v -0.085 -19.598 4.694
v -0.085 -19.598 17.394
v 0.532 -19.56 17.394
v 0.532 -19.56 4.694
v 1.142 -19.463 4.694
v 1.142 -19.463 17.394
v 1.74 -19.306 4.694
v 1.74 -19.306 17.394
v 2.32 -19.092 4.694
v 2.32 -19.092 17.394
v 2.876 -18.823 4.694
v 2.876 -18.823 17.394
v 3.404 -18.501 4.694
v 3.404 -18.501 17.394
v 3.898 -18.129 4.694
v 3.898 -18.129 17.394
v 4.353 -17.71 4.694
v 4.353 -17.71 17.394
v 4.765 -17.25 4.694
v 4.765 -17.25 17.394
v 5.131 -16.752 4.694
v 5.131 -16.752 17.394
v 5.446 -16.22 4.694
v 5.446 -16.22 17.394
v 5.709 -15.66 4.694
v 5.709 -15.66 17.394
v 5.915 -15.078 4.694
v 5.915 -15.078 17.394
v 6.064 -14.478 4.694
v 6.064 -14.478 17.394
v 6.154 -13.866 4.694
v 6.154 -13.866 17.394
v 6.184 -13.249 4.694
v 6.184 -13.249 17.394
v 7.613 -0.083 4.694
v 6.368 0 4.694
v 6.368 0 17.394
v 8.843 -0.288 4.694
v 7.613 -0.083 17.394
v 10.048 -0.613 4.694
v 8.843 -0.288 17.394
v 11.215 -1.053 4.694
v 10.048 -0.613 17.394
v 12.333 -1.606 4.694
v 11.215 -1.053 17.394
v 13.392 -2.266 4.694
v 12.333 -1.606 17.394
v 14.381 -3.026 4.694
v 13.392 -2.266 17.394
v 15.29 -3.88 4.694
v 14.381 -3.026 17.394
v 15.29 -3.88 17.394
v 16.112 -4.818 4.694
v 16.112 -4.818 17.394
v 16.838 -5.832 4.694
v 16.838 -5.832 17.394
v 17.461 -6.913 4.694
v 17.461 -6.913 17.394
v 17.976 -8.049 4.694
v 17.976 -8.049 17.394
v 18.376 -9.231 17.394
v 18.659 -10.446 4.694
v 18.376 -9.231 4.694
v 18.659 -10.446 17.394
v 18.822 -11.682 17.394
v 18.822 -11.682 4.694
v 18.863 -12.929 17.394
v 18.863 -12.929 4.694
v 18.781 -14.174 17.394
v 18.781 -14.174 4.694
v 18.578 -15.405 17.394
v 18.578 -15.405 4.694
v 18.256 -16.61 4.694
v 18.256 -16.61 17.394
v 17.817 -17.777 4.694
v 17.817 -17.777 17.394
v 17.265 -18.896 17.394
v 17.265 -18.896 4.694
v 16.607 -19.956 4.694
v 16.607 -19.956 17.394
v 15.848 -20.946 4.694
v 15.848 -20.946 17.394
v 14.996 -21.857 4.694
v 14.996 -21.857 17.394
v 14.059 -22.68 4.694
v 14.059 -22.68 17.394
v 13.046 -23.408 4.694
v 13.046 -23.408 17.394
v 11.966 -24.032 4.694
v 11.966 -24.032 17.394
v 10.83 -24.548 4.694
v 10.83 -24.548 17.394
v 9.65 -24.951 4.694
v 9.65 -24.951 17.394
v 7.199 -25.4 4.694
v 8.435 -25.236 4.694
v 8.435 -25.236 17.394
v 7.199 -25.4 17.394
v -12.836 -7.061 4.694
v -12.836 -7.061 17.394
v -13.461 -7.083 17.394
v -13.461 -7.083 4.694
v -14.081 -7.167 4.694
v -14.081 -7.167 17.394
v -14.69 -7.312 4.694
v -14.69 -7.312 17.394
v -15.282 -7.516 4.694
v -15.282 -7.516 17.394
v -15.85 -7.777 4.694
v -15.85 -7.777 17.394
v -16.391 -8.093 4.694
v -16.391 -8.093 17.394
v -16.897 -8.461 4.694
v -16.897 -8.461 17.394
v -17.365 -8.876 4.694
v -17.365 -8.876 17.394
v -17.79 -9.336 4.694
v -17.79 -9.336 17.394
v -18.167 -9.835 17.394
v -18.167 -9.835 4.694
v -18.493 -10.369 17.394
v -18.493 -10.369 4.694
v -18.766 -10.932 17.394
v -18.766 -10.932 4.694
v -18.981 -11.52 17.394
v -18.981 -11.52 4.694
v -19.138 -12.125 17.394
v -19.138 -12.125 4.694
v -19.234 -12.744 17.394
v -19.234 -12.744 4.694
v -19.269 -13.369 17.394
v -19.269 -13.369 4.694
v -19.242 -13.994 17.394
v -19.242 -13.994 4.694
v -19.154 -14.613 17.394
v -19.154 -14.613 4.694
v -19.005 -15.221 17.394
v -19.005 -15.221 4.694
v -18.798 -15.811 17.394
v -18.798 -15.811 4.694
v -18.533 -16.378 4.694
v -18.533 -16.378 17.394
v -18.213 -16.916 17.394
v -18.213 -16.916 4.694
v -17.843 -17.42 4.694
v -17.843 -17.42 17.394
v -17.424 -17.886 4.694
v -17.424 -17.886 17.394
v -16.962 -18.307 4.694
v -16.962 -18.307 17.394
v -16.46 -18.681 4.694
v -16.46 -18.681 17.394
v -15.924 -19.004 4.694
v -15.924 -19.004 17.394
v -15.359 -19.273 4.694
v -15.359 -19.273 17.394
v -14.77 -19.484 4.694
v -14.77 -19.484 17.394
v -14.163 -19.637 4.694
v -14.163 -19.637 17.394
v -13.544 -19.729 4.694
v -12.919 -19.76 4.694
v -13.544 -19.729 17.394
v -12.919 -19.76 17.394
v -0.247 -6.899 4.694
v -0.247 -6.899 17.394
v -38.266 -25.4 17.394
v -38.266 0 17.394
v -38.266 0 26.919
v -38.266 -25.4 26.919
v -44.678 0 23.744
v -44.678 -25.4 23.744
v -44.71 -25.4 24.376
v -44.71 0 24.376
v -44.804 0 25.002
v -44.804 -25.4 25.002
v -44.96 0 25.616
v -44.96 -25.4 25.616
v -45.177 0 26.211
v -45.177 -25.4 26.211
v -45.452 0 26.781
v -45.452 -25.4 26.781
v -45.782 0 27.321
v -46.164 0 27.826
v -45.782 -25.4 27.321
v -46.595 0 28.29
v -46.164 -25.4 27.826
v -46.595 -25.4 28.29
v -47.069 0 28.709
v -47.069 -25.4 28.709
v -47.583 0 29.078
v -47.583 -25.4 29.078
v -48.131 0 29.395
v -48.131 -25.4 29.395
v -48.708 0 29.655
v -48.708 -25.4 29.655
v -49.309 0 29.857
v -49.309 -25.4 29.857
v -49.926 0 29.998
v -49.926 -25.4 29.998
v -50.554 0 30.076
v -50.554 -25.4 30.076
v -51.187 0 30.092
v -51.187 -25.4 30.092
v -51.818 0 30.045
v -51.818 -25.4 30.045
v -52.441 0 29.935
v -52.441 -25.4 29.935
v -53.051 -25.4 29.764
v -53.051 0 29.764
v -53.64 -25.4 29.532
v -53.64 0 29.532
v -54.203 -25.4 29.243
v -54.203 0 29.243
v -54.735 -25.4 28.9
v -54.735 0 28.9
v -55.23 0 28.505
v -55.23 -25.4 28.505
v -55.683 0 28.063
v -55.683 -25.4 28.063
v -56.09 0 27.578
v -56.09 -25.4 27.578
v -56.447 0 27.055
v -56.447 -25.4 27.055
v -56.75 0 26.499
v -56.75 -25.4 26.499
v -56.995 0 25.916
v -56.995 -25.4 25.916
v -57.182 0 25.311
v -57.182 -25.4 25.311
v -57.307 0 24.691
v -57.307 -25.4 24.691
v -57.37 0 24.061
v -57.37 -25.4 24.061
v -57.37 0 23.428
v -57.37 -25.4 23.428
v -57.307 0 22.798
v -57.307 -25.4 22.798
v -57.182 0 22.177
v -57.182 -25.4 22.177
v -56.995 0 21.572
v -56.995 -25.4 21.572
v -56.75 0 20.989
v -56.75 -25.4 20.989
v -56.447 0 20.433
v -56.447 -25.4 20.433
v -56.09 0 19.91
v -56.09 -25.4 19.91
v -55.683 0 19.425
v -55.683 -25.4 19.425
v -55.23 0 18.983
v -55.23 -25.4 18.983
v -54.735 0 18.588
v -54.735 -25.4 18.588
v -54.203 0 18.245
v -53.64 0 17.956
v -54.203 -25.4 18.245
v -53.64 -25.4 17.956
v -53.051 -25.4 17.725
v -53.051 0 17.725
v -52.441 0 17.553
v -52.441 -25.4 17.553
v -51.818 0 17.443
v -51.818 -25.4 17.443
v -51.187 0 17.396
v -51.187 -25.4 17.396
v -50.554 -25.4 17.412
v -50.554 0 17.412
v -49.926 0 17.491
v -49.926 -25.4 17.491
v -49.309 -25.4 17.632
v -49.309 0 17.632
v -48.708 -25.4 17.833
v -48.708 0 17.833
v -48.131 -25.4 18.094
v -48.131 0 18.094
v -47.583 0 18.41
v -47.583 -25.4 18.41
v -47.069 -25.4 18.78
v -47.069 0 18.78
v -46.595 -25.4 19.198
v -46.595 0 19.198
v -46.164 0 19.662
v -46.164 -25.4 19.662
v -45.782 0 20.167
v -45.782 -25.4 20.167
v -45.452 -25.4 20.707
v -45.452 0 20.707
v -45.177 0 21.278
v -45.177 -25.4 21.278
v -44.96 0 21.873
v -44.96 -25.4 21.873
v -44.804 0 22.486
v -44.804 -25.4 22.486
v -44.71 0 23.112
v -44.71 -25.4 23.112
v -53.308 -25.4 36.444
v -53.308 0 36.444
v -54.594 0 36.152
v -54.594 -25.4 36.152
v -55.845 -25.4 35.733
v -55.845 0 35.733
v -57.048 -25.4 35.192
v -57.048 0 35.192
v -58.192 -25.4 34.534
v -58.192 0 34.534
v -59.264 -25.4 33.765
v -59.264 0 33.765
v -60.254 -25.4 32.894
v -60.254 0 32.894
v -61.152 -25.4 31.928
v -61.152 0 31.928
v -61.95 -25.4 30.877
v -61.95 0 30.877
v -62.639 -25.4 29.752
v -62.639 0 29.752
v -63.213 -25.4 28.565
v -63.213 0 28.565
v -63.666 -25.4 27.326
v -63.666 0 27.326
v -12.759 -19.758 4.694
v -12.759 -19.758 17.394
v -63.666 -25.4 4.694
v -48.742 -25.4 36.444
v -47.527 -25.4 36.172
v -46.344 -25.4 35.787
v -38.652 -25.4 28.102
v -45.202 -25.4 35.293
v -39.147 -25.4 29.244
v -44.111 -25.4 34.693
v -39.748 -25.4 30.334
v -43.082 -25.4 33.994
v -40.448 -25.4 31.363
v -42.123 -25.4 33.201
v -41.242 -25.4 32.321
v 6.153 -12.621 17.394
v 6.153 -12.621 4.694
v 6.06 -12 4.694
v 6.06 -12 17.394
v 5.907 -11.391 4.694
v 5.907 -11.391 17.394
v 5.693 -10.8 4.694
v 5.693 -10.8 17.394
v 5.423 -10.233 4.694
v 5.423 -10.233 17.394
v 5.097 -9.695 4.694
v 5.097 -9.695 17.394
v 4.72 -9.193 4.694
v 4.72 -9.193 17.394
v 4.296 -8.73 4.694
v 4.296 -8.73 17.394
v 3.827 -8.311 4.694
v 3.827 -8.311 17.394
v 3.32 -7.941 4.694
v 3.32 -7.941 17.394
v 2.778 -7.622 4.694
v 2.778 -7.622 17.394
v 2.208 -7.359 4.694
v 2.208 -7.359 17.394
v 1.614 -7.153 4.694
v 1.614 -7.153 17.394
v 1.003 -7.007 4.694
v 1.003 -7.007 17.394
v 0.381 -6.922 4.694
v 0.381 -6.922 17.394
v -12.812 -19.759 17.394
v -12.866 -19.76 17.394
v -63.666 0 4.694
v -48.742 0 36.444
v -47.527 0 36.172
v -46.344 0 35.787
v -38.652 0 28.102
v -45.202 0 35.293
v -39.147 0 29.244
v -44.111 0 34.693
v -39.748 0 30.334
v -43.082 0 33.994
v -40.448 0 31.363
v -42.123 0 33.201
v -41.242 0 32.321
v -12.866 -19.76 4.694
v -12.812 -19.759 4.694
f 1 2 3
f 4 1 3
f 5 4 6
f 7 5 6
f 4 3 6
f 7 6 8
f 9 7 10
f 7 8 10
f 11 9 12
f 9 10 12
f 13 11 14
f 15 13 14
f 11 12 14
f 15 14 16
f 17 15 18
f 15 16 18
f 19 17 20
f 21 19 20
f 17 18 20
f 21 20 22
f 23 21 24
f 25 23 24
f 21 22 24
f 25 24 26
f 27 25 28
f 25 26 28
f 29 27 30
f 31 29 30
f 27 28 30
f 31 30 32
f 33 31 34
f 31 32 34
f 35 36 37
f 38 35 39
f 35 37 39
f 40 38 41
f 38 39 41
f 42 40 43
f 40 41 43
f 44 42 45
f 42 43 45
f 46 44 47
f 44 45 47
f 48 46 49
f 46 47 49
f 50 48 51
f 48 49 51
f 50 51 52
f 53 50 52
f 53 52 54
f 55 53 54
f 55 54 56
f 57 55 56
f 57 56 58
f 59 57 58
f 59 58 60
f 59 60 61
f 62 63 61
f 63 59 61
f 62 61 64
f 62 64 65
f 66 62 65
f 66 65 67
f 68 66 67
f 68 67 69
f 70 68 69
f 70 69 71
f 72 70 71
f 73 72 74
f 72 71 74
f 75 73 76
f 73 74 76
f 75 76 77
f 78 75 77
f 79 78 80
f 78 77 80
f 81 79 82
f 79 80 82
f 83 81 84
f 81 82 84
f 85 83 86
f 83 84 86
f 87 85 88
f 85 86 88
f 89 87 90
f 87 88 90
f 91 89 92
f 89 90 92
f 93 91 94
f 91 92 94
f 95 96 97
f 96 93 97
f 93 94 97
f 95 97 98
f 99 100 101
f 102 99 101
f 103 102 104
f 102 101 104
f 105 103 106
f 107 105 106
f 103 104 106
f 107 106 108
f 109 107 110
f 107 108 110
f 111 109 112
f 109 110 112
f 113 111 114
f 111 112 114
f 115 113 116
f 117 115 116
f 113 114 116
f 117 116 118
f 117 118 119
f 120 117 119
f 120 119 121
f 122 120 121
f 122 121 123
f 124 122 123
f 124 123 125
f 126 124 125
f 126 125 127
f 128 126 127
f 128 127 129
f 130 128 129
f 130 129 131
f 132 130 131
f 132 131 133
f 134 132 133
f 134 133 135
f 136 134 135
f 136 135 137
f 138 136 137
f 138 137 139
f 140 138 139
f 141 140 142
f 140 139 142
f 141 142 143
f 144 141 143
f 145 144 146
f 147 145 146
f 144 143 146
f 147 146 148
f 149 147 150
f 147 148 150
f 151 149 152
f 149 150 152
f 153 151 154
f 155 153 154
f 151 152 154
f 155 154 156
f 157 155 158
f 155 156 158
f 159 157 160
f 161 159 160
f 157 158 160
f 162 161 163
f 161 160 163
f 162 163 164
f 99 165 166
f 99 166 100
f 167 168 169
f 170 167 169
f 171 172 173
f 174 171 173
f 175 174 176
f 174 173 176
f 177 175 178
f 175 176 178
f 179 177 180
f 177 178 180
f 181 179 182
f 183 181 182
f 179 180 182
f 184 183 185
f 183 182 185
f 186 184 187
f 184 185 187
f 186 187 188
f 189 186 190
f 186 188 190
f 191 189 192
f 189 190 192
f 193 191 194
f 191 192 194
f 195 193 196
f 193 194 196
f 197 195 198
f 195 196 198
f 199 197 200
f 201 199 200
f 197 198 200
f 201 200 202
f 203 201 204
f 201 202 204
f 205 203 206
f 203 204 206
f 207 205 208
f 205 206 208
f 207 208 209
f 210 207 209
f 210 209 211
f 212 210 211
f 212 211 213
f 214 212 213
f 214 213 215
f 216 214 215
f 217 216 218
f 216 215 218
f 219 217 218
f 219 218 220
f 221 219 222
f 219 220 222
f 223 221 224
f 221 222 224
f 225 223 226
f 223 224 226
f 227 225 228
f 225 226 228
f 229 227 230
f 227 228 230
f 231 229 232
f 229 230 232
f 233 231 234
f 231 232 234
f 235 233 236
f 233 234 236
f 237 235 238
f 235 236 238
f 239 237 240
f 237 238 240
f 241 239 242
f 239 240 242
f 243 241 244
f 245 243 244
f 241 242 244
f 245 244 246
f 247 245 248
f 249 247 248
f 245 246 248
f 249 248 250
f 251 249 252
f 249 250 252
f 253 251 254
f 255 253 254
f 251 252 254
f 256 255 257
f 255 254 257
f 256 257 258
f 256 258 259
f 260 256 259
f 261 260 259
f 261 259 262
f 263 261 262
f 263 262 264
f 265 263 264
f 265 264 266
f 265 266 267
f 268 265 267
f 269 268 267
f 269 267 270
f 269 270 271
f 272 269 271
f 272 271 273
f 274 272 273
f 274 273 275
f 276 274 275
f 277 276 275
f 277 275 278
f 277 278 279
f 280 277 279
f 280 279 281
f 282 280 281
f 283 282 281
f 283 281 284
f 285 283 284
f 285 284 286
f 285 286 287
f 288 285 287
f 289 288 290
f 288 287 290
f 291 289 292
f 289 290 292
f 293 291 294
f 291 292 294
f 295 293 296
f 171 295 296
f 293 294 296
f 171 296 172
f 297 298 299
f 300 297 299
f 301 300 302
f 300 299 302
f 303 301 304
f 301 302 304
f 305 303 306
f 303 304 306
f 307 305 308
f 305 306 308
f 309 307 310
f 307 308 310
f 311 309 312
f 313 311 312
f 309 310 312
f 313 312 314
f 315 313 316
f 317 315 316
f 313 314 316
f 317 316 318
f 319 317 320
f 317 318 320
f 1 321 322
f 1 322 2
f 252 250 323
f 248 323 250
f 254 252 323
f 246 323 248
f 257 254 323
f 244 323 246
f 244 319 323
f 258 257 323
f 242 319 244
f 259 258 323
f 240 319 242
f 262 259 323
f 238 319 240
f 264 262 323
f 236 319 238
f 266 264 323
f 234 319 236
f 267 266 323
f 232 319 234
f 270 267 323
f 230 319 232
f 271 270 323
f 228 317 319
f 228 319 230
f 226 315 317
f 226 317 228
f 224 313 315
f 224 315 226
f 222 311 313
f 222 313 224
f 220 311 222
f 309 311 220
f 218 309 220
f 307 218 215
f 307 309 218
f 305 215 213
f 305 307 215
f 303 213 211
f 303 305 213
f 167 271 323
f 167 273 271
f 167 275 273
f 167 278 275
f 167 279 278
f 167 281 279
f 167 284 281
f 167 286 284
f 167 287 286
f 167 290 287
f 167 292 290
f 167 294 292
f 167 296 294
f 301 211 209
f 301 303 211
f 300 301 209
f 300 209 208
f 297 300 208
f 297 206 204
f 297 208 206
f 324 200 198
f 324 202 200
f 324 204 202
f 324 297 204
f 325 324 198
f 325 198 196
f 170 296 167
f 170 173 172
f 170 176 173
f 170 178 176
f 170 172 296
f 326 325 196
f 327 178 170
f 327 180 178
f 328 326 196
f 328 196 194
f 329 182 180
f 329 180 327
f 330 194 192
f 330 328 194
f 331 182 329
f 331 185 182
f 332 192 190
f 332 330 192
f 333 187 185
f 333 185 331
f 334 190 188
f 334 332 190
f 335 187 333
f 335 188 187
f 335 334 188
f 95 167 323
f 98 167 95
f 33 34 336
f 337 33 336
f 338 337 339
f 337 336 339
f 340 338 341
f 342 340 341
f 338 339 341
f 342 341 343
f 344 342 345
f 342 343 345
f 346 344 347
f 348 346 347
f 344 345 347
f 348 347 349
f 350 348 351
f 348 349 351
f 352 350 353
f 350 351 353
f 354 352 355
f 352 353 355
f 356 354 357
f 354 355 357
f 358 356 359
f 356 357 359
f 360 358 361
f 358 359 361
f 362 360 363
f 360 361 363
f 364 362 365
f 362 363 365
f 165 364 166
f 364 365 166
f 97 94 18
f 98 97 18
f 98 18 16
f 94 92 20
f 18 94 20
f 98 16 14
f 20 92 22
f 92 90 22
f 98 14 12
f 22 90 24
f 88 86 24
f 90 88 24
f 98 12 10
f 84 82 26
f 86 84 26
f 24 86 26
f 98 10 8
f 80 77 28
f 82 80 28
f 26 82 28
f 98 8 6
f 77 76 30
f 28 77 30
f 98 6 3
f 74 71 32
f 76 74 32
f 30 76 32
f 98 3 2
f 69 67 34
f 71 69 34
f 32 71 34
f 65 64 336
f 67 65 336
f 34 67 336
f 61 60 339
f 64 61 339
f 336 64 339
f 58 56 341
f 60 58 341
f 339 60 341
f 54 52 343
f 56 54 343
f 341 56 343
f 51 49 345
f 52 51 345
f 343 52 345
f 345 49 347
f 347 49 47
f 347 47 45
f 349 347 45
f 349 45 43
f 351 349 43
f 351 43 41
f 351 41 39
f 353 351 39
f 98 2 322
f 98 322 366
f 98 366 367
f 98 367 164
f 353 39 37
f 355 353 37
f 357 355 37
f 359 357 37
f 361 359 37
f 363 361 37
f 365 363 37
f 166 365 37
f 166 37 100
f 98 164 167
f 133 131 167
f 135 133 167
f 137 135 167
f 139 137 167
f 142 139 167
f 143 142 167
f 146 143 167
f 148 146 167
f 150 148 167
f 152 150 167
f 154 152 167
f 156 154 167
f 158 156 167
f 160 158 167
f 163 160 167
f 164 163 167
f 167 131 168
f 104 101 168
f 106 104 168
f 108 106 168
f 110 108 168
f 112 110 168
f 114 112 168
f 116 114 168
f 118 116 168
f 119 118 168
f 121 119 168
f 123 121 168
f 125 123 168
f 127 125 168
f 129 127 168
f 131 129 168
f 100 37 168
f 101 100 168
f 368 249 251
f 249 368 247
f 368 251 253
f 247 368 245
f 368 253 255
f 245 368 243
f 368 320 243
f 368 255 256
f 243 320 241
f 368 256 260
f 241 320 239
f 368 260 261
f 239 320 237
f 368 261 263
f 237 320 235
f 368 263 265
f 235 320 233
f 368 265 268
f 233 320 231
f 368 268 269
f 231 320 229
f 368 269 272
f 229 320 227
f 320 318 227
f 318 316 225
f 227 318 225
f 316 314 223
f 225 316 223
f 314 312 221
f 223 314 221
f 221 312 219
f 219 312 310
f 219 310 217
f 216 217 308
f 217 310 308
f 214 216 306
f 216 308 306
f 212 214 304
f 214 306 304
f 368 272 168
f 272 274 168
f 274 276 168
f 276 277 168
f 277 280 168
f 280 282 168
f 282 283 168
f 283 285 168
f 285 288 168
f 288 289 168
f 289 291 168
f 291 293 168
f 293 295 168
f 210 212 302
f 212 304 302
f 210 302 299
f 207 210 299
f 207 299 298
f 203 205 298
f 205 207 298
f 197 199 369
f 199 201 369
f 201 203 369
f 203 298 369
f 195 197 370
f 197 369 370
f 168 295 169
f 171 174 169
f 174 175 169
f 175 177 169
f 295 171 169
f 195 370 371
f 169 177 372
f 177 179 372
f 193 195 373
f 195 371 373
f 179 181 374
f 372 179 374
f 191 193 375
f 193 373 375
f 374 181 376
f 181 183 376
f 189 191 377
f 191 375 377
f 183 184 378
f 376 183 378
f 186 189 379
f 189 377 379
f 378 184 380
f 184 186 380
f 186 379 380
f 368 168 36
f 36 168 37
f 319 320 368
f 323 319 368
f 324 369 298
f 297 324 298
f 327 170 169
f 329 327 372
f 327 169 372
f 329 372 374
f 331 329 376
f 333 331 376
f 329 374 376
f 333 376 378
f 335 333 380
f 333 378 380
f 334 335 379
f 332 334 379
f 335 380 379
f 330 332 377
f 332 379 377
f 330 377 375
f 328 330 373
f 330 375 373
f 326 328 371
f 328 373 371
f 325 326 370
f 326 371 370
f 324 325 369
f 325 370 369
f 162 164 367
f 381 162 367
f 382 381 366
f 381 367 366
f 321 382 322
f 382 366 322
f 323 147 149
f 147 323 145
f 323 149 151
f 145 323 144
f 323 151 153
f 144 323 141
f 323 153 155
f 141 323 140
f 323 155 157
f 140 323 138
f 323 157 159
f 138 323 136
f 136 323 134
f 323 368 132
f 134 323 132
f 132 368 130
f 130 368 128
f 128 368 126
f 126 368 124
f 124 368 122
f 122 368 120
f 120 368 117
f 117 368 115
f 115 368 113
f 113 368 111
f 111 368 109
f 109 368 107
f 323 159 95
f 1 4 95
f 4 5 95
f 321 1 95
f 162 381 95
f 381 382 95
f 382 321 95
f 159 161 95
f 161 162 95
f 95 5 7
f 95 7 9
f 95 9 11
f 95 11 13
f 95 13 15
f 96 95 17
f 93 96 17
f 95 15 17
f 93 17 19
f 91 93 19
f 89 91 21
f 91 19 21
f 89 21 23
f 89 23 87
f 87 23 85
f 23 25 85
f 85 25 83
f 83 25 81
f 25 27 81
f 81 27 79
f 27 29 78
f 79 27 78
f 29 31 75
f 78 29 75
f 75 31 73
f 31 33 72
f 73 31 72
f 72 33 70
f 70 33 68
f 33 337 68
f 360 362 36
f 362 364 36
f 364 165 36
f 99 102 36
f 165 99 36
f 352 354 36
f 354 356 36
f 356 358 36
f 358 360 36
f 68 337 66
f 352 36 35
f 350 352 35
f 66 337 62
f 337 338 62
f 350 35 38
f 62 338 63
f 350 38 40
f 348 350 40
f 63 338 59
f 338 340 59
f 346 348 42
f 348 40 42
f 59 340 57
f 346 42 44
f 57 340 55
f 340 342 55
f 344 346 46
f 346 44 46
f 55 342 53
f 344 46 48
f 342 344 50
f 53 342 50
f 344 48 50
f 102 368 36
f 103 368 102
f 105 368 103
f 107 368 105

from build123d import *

# Parameters (mm, degrees)
F1_DEPTH = 25.4
F4_DEPTH = 25.4
F5_R     = 6.35
F6_DEPTH = 25.4
F8_DEPTH = 25.4


with BuildPart() as f1:
    # F0 (on Front) → F1 (new body)
    with BuildSketch(Plane.XZ):
        with BuildLine():
            Line((-48.741896, 36.444197), (-53.308046, 36.444197))
            ThreePointArc((-53.308046, 36.444197), (-59.769484, 33.341808), (-63.66557, 27.325537))
            Line((-63.66557, 27.325537), (-63.66557, 4.694197))
            Line((-63.66557, 4.694197), (18.88443, 4.694197))
            Line((18.88443, 4.694197), (18.88443, 17.394197))
            Line((18.88443, 17.394197), (-38.26557, 17.394197))
            Line((-38.26557, 17.394197), (-38.26557, 26.919197))
            ThreePointArc((-38.26557, 26.919197), (-42.1227, 33.200663), (-48.741896, 36.444197))
        make_face()
    extrude(amount=F1_DEPTH)

    # F3 (on face) → F4 (cut)
    with BuildSketch(Plane.XY.offset(17.394197)):
        with BuildLine():
            ThreePointArc((6.368123, 0), (18.857612, -12.305201), (7.198642, -25.4))
            Line((7.198642, -25.4), (18.88443, -25.4))
            Line((18.88443, -25.4), (18.88443, 0))
            Line((18.88443, 0), (6.368123, 0))
        make_face()
    extrude(amount=-F4_DEPTH, mode=Mode.SUBTRACT)

    # F5 (on face) → F6 (cut)
    with BuildSketch(Plane.XZ.offset(25.4)):
        with Locations((-51.028371, 23.744197)):
            Circle(F5_R)
    extrude(amount=-F6_DEPTH, mode=Mode.SUBTRACT)

    # F7 (on face) → F8 (cut)
    with BuildSketch(Plane.XY.offset(17.394197)):
        with BuildLine():
            ThreePointArc((-0.085432, -19.59818), (4.352802, -17.71039), (6.18443, -13.248686))
            ThreePointArc((6.18443, -13.248686), (4.295666, -8.729851), (-0.247025, -6.899208))
            ThreePointArc((-0.247025, -6.899208), (-6.515056, -13.329482), (-0.085432, -19.59818))
        make_face()
        with BuildLine():
            ThreePointArc((-0.085432, -19.59818), (-6.515056, -13.329482), (-0.247025, -6.899208))
            Line((-0.247025, -6.899208), (-12.835866, -7.060705))
            ThreePointArc((-12.835866, -7.060705), (-8.39968, -8.949577), (-6.569161, -13.410158))
            ThreePointArc((-6.569161, -13.410158), (-8.372724, -17.843262), (-12.758896, -19.758136))
            Line((-12.758896, -19.758136), (-0.085432, -19.59818))
        make_face()
        with BuildLine():
            ThreePointArc((-6.569161, -13.410158), (-8.39968, -8.949577), (-12.835866, -7.060705))
            ThreePointArc((-12.835866, -7.060705), (-19.269025, -13.36851), (-12.919161, -19.760158))
            Line((-12.919161, -19.760158), (-12.758896, -19.758136))
            ThreePointArc((-12.758896, -19.758136), (-8.372724, -17.843262), (-6.569161, -13.410158))
        make_face()
        with BuildLine():
            ThreePointArc((-12.919161, -19.760158), (-12.839022, -19.759653), (-12.758896, -19.758136))
            Line((-12.758896, -19.758136), (-12.919161, -19.760158))
        make_face()
    extrude(amount=-F8_DEPTH, mode=Mode.SUBTRACT)


solid = f1.part
